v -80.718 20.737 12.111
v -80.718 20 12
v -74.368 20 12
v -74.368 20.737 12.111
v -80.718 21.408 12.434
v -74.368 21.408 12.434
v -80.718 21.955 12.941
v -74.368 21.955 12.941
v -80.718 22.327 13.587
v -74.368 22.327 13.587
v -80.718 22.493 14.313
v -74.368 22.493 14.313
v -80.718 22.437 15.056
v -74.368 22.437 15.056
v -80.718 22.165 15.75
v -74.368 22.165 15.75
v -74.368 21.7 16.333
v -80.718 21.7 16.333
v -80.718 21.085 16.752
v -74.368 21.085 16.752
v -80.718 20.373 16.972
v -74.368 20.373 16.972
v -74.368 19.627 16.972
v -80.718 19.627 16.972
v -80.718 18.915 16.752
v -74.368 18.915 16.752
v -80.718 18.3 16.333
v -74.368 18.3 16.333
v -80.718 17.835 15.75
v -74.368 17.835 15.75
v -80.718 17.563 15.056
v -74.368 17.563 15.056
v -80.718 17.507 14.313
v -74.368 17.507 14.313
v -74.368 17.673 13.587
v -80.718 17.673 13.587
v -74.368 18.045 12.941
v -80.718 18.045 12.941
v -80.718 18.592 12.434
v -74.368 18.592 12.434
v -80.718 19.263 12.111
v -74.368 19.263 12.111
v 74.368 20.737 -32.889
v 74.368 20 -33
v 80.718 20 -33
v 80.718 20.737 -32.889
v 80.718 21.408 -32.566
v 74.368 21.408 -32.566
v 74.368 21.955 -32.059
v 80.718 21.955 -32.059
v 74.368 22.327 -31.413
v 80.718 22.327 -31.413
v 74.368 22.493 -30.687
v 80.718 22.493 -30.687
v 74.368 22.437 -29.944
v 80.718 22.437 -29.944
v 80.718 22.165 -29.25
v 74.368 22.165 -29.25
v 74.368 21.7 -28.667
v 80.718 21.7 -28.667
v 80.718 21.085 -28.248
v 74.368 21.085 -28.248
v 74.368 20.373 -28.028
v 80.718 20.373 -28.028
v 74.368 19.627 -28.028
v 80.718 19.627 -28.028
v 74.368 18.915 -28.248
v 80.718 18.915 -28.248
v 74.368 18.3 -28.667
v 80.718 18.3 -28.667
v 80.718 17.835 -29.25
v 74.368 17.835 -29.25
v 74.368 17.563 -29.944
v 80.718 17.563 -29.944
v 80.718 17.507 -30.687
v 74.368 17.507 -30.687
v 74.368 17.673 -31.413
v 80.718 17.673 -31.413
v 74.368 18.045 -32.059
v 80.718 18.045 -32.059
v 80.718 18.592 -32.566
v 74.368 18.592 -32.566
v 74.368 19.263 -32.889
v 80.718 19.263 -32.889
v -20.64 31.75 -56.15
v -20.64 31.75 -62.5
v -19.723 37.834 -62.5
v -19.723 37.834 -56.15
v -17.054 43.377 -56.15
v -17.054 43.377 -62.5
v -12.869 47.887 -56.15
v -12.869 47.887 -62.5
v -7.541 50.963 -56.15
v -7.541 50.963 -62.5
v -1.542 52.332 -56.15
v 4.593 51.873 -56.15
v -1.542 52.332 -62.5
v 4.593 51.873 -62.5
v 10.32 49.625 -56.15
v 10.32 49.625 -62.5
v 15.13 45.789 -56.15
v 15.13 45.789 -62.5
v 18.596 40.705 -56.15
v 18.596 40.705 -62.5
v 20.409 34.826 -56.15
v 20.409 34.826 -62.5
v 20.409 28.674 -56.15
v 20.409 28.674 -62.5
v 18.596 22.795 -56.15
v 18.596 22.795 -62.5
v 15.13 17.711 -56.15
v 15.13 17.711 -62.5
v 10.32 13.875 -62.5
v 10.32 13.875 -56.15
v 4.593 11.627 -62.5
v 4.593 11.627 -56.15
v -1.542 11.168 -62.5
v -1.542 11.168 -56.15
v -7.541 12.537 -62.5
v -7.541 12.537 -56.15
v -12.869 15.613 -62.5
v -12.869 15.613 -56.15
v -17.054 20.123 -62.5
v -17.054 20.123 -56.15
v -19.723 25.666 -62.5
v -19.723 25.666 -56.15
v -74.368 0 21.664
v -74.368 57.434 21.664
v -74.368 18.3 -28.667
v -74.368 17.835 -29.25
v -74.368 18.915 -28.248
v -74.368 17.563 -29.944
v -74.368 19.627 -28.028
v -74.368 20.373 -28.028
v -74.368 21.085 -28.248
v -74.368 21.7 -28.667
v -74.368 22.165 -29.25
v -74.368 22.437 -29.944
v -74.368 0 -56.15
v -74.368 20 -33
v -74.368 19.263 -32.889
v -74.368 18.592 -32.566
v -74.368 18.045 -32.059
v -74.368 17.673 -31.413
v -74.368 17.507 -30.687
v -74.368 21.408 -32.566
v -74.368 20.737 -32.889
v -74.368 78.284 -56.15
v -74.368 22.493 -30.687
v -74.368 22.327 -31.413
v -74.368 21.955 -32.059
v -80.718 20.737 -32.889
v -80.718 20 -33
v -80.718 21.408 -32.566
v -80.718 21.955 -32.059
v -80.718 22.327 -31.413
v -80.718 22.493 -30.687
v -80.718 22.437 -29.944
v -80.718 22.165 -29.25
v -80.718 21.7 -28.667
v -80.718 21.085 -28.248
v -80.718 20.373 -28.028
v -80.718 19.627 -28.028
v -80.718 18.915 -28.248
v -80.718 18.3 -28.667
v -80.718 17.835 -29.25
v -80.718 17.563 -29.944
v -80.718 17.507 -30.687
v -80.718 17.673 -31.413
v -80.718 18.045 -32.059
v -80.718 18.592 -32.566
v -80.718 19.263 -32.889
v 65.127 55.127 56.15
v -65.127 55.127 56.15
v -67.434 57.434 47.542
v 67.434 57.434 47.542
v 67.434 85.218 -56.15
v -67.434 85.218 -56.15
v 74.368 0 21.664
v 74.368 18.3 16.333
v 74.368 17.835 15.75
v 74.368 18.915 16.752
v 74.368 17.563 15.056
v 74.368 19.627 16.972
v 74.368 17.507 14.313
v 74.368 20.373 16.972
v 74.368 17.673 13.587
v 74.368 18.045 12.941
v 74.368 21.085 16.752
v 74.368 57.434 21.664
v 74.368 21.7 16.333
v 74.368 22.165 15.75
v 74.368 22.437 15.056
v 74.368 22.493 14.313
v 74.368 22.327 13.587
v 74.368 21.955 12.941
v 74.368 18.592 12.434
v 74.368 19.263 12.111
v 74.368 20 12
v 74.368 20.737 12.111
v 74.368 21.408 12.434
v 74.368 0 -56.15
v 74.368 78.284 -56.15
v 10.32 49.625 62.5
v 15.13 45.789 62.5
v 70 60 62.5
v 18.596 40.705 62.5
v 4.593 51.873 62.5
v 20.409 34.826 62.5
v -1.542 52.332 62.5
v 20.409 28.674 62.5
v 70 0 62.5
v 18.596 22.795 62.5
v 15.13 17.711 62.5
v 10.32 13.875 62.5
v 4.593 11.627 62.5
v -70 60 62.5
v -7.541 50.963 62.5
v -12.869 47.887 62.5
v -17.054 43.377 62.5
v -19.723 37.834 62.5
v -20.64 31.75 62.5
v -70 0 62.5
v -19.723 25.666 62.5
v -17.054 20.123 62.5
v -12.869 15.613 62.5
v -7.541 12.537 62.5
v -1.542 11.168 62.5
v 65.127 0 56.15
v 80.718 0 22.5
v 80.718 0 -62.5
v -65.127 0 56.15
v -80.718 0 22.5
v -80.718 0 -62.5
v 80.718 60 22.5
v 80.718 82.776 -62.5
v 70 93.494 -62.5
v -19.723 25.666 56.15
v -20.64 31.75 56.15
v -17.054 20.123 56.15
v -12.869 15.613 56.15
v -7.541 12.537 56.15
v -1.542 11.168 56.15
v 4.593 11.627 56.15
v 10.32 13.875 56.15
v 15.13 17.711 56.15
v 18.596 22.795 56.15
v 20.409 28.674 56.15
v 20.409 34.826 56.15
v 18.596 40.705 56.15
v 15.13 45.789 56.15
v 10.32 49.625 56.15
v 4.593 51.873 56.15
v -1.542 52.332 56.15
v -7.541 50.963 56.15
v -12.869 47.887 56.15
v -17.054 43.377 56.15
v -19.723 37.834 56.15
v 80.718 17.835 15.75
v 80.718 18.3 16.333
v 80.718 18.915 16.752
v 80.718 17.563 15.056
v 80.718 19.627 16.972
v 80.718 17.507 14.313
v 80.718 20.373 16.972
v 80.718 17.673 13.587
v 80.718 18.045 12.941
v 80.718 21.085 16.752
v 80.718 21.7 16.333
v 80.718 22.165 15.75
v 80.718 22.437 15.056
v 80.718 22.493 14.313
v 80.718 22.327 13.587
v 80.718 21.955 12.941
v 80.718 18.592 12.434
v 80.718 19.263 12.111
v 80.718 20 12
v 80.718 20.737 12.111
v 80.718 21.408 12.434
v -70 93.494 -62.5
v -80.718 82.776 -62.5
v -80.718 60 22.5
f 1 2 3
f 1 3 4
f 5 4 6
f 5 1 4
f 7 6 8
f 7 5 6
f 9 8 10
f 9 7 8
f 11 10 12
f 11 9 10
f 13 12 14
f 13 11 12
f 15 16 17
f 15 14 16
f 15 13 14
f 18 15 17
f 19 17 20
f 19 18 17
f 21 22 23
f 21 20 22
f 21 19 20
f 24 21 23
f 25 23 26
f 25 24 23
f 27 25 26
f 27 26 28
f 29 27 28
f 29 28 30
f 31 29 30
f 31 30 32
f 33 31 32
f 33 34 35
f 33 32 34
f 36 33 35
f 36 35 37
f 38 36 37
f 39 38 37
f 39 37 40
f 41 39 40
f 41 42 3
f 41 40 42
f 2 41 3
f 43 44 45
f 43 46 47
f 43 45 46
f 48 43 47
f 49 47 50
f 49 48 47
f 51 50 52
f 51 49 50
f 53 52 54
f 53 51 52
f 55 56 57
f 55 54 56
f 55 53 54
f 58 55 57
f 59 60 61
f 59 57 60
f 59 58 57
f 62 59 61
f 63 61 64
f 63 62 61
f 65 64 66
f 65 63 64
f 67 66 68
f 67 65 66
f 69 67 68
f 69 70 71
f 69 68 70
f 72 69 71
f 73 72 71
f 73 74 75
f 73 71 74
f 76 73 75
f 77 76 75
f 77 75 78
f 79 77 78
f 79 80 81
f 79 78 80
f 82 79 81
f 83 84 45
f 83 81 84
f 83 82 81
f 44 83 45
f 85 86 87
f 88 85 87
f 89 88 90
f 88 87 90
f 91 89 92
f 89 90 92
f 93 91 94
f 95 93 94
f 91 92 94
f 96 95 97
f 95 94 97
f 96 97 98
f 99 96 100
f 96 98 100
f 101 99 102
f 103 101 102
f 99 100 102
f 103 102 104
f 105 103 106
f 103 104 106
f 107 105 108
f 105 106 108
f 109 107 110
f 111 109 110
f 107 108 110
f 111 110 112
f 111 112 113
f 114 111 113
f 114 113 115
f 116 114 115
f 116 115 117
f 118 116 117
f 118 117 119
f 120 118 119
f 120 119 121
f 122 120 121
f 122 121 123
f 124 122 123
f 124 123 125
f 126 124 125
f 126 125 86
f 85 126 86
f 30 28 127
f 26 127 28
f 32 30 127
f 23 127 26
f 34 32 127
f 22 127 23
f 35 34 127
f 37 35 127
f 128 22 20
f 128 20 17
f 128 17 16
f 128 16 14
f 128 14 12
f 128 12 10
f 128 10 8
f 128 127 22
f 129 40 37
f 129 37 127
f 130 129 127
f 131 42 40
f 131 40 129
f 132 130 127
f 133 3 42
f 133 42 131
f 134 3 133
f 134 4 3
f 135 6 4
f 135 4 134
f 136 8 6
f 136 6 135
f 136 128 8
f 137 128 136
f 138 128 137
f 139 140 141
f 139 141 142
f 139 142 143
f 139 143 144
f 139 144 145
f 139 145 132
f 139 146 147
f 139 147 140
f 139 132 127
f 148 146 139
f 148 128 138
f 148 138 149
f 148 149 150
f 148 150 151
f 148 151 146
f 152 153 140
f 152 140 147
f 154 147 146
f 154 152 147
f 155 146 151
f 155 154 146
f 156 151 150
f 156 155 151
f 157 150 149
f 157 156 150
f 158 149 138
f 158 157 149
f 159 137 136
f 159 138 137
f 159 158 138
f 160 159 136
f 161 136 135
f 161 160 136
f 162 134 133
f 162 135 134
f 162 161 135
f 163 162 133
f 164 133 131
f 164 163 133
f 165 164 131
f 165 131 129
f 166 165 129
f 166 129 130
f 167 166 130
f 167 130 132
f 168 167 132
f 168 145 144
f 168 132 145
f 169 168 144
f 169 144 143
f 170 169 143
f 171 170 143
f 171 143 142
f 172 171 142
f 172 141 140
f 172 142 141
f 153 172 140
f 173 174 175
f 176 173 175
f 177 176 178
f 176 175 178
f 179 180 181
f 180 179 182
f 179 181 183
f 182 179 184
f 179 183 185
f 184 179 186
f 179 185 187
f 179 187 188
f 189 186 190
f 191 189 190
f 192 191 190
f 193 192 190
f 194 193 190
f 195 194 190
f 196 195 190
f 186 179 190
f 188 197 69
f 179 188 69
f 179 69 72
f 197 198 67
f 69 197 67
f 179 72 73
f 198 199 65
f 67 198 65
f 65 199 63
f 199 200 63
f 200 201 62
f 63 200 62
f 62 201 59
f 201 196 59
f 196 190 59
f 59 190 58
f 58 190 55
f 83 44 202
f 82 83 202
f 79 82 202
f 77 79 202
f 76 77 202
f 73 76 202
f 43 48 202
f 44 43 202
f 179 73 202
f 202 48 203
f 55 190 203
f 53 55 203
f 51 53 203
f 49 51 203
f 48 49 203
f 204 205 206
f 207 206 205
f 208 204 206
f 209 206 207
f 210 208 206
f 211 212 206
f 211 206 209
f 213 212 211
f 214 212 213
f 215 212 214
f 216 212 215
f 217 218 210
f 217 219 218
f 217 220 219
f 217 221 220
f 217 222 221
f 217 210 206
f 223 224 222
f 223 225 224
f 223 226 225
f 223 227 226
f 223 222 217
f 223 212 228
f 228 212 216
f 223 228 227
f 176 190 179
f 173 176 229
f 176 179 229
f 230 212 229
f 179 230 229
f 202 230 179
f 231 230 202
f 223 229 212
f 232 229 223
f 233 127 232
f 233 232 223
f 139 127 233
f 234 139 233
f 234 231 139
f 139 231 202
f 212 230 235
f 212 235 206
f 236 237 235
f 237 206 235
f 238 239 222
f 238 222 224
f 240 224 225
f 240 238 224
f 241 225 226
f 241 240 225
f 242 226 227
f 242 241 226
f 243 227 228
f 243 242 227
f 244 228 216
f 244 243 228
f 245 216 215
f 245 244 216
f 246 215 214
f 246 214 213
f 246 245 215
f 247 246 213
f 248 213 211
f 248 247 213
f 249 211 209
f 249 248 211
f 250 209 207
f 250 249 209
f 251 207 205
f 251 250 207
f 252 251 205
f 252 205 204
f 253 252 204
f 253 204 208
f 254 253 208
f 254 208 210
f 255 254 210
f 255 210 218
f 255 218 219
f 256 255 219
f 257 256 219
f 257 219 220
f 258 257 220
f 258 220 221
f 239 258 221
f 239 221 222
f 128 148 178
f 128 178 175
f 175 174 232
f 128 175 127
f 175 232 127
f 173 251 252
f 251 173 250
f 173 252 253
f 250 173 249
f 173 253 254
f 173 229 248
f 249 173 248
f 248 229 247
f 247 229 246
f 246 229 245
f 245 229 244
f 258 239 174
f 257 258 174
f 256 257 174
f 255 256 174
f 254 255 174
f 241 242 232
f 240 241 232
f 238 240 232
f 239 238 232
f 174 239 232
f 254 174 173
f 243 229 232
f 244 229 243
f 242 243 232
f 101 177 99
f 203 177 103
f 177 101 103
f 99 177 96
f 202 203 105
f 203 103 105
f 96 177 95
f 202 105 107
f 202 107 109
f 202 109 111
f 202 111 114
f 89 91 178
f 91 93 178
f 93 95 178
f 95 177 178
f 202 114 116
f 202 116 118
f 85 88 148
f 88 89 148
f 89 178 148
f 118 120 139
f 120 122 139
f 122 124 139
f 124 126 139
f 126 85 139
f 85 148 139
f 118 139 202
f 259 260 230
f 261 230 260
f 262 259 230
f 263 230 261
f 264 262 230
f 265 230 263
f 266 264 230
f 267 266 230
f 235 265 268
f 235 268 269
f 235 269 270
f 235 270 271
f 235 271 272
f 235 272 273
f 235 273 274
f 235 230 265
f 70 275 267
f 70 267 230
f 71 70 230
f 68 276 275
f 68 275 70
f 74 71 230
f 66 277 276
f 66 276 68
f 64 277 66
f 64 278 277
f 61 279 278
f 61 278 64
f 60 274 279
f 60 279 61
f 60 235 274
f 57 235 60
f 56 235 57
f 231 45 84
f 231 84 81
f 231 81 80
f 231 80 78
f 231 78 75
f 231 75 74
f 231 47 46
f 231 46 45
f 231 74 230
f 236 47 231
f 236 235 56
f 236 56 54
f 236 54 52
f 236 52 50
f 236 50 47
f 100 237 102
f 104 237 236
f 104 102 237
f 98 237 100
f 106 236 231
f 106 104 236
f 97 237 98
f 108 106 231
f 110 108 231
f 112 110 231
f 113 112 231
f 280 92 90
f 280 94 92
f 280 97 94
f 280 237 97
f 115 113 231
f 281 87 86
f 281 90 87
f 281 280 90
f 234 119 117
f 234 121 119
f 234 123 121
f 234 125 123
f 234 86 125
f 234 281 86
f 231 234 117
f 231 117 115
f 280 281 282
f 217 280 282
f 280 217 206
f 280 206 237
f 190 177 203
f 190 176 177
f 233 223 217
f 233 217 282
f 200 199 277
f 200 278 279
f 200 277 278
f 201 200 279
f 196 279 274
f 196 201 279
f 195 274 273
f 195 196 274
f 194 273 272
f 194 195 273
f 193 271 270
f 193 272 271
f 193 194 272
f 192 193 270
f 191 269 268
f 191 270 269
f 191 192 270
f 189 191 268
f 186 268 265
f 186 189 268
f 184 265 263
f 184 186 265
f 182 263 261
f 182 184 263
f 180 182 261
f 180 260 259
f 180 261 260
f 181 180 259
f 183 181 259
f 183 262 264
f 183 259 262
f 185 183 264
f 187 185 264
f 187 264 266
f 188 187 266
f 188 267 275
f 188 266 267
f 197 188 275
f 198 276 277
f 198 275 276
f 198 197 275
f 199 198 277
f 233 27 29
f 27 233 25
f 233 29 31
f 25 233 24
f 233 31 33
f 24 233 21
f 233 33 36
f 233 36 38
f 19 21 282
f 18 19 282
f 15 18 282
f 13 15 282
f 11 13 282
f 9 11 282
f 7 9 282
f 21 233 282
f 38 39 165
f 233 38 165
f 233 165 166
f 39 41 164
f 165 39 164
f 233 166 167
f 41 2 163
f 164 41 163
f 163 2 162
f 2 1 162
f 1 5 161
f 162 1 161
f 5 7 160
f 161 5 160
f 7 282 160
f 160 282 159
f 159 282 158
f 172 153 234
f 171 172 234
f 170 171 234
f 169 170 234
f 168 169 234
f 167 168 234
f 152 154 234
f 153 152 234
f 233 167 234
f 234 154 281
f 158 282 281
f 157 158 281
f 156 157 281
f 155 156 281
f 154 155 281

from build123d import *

# Parameters (mm, degrees)
BOSS_EXTRUDE1_DEPTH      = 60
BOSS_EXTRUDE2_DEPTH      = 70
BOSS_EXTRUDE2_DEPTH_BACK = 70
BOSS_EXTRUDE3_DEPTH      = 125
SKETCH5_W                = 177.8
SKETCH5_H                = 177.8
CUT_EXTRUDE1_DEPTH       = 206.048289966
SKETCH6_W                = 177.8
SKETCH6_H                = 177.8
CUT_EXTRUDE2_DEPTH       = 206.048289966
CUT_EXTRUDE5_START       = 93.49365
SKETCH10_W               = 39.282032303
SKETCH10_H               = 90
CUT_EXTRUDE5_DEPTH       = 247.327703168
SHELL1_T                 = -6.35
SKETCH7_R                = 20.64
CUT_EXTRUDE3_DEPTH       = 25.4
CUT_EXTRUDE4_START       = -25.4
SKETCH8_R                = 20.64
CUT_EXTRUDE4_DEPTH       = 25.4
CUT_EXTRUDE6_DEPTH       = 139.429414225
CUT_EXTRUDE6_DEPTH_BACK  = 139.429414225
SKETCH11_R               = 2.5


with BuildPart() as part:
    # Sketch1 → Boss-Extrude1 (new body)
    with BuildSketch(Plane(origin=(0, 0, 0), x_dir=(1, 0, 0), z_dir=(0, 1, 0))):
        Polygon((-103.493649054, 62.5), (103.493649054, 62.5), (70, -62.5), (-70, -62.5), align=None)
    extrude(amount=BOSS_EXTRUDE1_DEPTH)

    # Sketch2 → Boss-Extrude2 (add, two sides: drawn at the far end of the back side and taken through both)
    with BuildSketch(Plane(origin=(0, 0, 0), x_dir=(0, 0, -1), z_dir=(1, 0, 0)).offset(-BOSS_EXTRUDE2_DEPTH_BACK)):
        Polygon((-62.5, 60), (62.5, 93.493649054), (62.5, 60), align=None)
    extrude(amount=BOSS_EXTRUDE2_DEPTH + BOSS_EXTRUDE2_DEPTH_BACK)

    # Sketch4 → Boss-Extrude3 (add)
    with BuildSketch(Plane(origin=(0, 0, -62.5), x_dir=(-1, 0, 0), z_dir=(0, 0, -1))):
        Polygon((-70, 93.493649054), (-70, 60), (-103.493649054, 60), align=None)
        Polygon((70, 60), (103.493649054, 60), (70, 93.493649054), align=None)
    extrude(amount=-BOSS_EXTRUDE3_DEPTH)

    # Sketch5 → Cut-Extrude1 (cut, through all)
    with BuildSketch(Plane(origin=(70.830704378, 70.830704378, 18.979030037), x_dir=(0.7186724352001954, -0.6601192398037351, -0.21852350016499306), z_dir=(0.6947465906068516, 0.6947465906068802, 0.18615678789738468))):
        Rectangle(SKETCH5_W, SKETCH5_H)
    extrude(amount=CUT_EXTRUDE1_DEPTH, mode=Mode.SUBTRACT)

    # Sketch6 → Cut-Extrude2 (cut, through all)
    with BuildSketch(Plane(origin=(-70.830704378, 70.830704378, 18.979030037), x_dir=(0.7186724352001954, 0.6601192398037351, 0.21852350016499306), z_dir=(-0.6947465906068516, 0.6947465906068802, 0.18615678789738468))):
        Rectangle(SKETCH6_W, SKETCH6_H)
    extrude(amount=CUT_EXTRUDE2_DEPTH, mode=Mode.SUBTRACT)

    # Sketch10 → Cut-Extrude5 (cut, through all)
    with BuildSketch(Plane(origin=(0, 0, 0), x_dir=(1, 0, 0), z_dir=(0, 1, 0)).offset(CUT_EXTRUDE5_START)):
        with Locations((-100.358983849, 22.5)):
            Rectangle(SKETCH10_W, SKETCH10_H)
        with Locations((100.358983849, 22.5)):
            Rectangle(SKETCH10_W, SKETCH10_H)
    extrude(amount=-CUT_EXTRUDE5_DEPTH, mode=Mode.SUBTRACT)

    # Shell1
    shell1_openings = [part.faces().sort_by_distance(p)[0] for p in [
        (0, 0, -1.067232638),
    ]]
    offset(amount=SHELL1_T, openings=shell1_openings, kind=Kind.INTERSECTION)

    # Sketch7 → Cut-Extrude3 (cut)
    with BuildSketch(Plane(origin=(0, 0, -62.5), x_dir=(-1, 0, 0), z_dir=(0, 0, -1))):
        with Locations((0, 31.75)):
            Circle(SKETCH7_R)
    extrude(amount=-CUT_EXTRUDE3_DEPTH, mode=Mode.SUBTRACT)

    # Sketch8 → Cut-Extrude4 (cut)
    with BuildSketch(Plane.XY.offset(62.5).offset(CUT_EXTRUDE4_START)):
        with Locations(Location((0, 31.75, 0), (0, 0, 180))):
            Circle(SKETCH8_R)
    extrude(amount=CUT_EXTRUDE4_DEPTH, mode=Mode.SUBTRACT)

    # Sketch11 → Cut-Extrude6 (cut, two sides: drawn at the far end of the back side and taken through both)
    with BuildSketch(Plane(origin=(0, 0, 0), x_dir=(0, 0, -1), z_dir=(1, 0, 0)).offset(-CUT_EXTRUDE6_DEPTH_BACK)):
        with Locations((-14.5, 20)):
            Circle(SKETCH11_R)
        with Locations((30.5, 20)):
            Circle(SKETCH11_R)
    extrude(amount=CUT_EXTRUDE6_DEPTH + CUT_EXTRUDE6_DEPTH_BACK, mode=Mode.SUBTRACT)


solid = part.part
